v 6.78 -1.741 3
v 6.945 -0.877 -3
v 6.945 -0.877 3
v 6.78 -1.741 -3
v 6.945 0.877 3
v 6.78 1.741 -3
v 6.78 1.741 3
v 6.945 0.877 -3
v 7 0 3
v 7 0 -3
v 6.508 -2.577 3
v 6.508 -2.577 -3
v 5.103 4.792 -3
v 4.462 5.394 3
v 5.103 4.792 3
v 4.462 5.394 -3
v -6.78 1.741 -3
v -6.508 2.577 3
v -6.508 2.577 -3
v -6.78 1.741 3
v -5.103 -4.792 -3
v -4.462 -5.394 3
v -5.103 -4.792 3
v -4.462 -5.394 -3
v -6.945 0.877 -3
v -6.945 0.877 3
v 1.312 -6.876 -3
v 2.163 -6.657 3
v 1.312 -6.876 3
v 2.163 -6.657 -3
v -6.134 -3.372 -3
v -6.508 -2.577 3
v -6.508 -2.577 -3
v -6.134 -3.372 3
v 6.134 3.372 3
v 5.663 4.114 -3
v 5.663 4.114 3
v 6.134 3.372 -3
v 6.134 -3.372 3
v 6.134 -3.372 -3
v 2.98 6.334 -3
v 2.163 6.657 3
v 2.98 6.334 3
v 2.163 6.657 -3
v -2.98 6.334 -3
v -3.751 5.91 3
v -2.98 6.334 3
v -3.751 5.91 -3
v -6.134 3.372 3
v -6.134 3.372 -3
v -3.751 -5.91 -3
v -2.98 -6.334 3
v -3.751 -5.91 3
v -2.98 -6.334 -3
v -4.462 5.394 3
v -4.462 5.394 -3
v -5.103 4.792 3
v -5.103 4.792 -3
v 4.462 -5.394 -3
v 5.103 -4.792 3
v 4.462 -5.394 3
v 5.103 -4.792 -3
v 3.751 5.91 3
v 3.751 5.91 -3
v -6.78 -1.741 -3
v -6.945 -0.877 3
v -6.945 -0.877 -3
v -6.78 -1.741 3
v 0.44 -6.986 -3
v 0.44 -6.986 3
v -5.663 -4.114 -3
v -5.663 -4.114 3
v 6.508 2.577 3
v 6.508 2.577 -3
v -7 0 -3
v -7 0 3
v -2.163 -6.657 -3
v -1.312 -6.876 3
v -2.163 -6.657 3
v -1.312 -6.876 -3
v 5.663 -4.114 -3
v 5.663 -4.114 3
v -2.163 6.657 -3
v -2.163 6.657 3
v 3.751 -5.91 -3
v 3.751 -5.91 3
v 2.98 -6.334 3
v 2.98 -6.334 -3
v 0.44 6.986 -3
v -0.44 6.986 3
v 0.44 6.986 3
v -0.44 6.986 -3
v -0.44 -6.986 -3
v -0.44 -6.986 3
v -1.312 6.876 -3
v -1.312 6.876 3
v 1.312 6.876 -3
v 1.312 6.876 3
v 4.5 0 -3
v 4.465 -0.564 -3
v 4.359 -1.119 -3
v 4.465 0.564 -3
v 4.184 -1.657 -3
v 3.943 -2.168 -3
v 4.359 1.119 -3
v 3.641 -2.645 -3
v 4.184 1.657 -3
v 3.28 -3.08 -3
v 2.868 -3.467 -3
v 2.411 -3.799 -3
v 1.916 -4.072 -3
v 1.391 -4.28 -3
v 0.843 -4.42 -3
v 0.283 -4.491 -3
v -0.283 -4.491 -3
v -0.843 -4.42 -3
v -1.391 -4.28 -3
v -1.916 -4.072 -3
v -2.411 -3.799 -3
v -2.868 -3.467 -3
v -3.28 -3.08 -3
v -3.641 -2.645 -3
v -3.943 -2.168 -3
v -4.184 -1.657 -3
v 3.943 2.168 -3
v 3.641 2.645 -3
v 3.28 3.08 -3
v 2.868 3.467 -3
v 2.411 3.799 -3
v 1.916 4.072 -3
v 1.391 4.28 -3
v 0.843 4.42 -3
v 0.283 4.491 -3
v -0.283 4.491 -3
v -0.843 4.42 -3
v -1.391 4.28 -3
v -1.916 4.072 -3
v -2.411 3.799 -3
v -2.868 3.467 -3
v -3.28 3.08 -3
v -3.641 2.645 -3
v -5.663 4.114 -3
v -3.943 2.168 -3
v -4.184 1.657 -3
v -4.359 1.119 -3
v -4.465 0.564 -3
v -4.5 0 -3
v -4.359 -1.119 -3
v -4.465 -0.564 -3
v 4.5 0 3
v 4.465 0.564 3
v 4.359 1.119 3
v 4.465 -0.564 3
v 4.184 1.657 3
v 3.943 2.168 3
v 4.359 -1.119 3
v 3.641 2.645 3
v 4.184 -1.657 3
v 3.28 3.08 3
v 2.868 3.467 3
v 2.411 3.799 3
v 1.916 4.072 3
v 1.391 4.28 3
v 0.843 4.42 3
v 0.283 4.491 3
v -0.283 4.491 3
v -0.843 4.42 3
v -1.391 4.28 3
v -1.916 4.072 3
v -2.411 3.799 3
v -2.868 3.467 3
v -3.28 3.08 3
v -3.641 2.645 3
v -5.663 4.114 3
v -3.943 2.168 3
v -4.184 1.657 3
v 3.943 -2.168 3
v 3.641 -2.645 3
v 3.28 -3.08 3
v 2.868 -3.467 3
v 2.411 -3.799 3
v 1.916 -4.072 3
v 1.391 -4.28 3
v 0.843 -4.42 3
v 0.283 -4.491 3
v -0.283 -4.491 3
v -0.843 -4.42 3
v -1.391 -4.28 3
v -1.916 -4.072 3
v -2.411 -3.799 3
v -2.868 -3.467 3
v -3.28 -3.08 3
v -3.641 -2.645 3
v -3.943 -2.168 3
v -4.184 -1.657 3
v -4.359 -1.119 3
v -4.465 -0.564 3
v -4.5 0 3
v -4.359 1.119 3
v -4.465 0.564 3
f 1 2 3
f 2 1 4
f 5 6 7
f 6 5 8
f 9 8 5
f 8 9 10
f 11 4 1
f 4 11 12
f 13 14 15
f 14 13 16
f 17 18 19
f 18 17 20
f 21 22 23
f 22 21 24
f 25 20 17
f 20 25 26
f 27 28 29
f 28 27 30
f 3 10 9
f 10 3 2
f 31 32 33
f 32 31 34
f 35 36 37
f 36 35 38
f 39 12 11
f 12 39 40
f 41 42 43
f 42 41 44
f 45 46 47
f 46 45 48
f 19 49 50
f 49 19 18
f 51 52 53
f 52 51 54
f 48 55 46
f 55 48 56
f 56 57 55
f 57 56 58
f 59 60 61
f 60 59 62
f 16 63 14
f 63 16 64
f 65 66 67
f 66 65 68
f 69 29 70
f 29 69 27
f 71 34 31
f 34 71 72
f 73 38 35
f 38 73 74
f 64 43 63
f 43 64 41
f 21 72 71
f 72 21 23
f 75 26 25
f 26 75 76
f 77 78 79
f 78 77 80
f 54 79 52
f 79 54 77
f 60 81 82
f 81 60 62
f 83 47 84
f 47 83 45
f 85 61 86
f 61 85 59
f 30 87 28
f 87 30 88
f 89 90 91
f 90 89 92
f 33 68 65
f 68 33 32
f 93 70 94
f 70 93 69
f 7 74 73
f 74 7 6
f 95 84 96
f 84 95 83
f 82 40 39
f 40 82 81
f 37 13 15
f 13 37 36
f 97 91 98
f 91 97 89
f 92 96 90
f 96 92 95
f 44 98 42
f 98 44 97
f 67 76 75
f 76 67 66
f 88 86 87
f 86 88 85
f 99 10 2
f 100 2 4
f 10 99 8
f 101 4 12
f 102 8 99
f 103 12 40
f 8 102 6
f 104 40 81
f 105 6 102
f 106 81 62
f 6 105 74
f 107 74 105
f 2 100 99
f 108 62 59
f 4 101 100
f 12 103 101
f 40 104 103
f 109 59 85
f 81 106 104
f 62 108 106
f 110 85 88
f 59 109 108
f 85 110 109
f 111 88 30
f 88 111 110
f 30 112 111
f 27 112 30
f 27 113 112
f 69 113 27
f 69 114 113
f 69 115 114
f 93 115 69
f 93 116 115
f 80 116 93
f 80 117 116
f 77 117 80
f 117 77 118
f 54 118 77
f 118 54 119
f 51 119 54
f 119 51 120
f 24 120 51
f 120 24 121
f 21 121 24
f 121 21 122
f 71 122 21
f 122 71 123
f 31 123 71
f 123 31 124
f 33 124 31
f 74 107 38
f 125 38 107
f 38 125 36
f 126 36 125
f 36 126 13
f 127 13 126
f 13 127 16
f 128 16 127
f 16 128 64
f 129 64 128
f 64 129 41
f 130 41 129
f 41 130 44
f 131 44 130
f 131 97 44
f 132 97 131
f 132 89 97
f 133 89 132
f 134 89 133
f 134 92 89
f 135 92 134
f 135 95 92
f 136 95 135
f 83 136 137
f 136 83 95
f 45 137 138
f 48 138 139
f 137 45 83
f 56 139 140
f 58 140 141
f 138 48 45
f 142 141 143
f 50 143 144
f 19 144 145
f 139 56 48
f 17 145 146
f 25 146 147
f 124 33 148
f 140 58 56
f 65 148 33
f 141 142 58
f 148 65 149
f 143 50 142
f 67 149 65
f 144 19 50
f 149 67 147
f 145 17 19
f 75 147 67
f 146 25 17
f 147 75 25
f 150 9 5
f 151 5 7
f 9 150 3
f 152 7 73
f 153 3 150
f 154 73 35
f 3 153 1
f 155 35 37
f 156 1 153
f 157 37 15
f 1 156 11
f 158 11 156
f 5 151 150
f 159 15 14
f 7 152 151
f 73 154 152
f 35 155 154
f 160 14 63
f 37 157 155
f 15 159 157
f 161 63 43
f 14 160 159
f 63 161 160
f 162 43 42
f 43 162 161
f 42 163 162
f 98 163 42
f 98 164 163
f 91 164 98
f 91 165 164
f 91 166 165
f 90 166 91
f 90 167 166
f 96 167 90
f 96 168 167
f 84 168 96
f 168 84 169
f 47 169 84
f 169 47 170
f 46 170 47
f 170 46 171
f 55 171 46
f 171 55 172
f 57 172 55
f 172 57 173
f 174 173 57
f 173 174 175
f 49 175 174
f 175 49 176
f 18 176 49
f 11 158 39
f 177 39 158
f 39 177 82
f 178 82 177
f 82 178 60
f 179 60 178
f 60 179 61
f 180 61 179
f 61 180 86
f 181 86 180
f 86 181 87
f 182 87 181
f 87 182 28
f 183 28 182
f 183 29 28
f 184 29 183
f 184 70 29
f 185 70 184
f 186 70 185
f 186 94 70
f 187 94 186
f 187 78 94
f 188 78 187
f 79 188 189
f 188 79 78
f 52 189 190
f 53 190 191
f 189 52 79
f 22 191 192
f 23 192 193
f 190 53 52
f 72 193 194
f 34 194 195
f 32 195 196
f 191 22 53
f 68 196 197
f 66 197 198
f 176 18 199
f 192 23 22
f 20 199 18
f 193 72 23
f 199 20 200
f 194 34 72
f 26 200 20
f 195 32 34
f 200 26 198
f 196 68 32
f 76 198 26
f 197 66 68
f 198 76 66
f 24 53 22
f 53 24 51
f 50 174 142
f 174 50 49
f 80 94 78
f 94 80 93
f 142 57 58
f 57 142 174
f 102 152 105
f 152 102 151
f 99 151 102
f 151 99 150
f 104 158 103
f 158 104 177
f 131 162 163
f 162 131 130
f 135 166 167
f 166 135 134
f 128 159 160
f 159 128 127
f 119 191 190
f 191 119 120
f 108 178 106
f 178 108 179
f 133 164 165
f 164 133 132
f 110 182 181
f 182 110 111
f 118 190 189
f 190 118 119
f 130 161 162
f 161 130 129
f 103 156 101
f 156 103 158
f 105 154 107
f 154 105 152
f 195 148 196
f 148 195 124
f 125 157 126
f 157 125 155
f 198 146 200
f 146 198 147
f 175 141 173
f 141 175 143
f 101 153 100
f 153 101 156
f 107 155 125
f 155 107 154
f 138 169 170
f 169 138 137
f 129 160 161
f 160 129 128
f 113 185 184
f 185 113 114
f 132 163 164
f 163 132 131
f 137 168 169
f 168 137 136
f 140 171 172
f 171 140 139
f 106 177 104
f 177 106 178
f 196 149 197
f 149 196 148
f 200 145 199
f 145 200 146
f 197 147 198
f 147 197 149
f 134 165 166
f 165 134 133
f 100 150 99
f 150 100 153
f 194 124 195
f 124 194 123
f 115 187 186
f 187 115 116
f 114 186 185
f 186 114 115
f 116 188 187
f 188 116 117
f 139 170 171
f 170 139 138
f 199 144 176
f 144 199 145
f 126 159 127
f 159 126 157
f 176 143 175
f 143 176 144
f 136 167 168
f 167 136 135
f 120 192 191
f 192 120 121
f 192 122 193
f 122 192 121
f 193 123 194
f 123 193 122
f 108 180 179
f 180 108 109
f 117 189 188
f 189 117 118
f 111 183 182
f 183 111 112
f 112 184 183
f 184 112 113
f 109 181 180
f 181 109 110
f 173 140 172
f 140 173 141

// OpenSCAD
$fn = 50;


difference() {
	union() {
		translate(v = [0, 0, -3.0000000000]) {
			cylinder(h = 6, r = 7.0000000000);
		}
	}
	union() {
		translate(v = [0, 0, -100.0000000000]) {
			cylinder(h = 200, r = 4.5000000000);
		}
	}
}
